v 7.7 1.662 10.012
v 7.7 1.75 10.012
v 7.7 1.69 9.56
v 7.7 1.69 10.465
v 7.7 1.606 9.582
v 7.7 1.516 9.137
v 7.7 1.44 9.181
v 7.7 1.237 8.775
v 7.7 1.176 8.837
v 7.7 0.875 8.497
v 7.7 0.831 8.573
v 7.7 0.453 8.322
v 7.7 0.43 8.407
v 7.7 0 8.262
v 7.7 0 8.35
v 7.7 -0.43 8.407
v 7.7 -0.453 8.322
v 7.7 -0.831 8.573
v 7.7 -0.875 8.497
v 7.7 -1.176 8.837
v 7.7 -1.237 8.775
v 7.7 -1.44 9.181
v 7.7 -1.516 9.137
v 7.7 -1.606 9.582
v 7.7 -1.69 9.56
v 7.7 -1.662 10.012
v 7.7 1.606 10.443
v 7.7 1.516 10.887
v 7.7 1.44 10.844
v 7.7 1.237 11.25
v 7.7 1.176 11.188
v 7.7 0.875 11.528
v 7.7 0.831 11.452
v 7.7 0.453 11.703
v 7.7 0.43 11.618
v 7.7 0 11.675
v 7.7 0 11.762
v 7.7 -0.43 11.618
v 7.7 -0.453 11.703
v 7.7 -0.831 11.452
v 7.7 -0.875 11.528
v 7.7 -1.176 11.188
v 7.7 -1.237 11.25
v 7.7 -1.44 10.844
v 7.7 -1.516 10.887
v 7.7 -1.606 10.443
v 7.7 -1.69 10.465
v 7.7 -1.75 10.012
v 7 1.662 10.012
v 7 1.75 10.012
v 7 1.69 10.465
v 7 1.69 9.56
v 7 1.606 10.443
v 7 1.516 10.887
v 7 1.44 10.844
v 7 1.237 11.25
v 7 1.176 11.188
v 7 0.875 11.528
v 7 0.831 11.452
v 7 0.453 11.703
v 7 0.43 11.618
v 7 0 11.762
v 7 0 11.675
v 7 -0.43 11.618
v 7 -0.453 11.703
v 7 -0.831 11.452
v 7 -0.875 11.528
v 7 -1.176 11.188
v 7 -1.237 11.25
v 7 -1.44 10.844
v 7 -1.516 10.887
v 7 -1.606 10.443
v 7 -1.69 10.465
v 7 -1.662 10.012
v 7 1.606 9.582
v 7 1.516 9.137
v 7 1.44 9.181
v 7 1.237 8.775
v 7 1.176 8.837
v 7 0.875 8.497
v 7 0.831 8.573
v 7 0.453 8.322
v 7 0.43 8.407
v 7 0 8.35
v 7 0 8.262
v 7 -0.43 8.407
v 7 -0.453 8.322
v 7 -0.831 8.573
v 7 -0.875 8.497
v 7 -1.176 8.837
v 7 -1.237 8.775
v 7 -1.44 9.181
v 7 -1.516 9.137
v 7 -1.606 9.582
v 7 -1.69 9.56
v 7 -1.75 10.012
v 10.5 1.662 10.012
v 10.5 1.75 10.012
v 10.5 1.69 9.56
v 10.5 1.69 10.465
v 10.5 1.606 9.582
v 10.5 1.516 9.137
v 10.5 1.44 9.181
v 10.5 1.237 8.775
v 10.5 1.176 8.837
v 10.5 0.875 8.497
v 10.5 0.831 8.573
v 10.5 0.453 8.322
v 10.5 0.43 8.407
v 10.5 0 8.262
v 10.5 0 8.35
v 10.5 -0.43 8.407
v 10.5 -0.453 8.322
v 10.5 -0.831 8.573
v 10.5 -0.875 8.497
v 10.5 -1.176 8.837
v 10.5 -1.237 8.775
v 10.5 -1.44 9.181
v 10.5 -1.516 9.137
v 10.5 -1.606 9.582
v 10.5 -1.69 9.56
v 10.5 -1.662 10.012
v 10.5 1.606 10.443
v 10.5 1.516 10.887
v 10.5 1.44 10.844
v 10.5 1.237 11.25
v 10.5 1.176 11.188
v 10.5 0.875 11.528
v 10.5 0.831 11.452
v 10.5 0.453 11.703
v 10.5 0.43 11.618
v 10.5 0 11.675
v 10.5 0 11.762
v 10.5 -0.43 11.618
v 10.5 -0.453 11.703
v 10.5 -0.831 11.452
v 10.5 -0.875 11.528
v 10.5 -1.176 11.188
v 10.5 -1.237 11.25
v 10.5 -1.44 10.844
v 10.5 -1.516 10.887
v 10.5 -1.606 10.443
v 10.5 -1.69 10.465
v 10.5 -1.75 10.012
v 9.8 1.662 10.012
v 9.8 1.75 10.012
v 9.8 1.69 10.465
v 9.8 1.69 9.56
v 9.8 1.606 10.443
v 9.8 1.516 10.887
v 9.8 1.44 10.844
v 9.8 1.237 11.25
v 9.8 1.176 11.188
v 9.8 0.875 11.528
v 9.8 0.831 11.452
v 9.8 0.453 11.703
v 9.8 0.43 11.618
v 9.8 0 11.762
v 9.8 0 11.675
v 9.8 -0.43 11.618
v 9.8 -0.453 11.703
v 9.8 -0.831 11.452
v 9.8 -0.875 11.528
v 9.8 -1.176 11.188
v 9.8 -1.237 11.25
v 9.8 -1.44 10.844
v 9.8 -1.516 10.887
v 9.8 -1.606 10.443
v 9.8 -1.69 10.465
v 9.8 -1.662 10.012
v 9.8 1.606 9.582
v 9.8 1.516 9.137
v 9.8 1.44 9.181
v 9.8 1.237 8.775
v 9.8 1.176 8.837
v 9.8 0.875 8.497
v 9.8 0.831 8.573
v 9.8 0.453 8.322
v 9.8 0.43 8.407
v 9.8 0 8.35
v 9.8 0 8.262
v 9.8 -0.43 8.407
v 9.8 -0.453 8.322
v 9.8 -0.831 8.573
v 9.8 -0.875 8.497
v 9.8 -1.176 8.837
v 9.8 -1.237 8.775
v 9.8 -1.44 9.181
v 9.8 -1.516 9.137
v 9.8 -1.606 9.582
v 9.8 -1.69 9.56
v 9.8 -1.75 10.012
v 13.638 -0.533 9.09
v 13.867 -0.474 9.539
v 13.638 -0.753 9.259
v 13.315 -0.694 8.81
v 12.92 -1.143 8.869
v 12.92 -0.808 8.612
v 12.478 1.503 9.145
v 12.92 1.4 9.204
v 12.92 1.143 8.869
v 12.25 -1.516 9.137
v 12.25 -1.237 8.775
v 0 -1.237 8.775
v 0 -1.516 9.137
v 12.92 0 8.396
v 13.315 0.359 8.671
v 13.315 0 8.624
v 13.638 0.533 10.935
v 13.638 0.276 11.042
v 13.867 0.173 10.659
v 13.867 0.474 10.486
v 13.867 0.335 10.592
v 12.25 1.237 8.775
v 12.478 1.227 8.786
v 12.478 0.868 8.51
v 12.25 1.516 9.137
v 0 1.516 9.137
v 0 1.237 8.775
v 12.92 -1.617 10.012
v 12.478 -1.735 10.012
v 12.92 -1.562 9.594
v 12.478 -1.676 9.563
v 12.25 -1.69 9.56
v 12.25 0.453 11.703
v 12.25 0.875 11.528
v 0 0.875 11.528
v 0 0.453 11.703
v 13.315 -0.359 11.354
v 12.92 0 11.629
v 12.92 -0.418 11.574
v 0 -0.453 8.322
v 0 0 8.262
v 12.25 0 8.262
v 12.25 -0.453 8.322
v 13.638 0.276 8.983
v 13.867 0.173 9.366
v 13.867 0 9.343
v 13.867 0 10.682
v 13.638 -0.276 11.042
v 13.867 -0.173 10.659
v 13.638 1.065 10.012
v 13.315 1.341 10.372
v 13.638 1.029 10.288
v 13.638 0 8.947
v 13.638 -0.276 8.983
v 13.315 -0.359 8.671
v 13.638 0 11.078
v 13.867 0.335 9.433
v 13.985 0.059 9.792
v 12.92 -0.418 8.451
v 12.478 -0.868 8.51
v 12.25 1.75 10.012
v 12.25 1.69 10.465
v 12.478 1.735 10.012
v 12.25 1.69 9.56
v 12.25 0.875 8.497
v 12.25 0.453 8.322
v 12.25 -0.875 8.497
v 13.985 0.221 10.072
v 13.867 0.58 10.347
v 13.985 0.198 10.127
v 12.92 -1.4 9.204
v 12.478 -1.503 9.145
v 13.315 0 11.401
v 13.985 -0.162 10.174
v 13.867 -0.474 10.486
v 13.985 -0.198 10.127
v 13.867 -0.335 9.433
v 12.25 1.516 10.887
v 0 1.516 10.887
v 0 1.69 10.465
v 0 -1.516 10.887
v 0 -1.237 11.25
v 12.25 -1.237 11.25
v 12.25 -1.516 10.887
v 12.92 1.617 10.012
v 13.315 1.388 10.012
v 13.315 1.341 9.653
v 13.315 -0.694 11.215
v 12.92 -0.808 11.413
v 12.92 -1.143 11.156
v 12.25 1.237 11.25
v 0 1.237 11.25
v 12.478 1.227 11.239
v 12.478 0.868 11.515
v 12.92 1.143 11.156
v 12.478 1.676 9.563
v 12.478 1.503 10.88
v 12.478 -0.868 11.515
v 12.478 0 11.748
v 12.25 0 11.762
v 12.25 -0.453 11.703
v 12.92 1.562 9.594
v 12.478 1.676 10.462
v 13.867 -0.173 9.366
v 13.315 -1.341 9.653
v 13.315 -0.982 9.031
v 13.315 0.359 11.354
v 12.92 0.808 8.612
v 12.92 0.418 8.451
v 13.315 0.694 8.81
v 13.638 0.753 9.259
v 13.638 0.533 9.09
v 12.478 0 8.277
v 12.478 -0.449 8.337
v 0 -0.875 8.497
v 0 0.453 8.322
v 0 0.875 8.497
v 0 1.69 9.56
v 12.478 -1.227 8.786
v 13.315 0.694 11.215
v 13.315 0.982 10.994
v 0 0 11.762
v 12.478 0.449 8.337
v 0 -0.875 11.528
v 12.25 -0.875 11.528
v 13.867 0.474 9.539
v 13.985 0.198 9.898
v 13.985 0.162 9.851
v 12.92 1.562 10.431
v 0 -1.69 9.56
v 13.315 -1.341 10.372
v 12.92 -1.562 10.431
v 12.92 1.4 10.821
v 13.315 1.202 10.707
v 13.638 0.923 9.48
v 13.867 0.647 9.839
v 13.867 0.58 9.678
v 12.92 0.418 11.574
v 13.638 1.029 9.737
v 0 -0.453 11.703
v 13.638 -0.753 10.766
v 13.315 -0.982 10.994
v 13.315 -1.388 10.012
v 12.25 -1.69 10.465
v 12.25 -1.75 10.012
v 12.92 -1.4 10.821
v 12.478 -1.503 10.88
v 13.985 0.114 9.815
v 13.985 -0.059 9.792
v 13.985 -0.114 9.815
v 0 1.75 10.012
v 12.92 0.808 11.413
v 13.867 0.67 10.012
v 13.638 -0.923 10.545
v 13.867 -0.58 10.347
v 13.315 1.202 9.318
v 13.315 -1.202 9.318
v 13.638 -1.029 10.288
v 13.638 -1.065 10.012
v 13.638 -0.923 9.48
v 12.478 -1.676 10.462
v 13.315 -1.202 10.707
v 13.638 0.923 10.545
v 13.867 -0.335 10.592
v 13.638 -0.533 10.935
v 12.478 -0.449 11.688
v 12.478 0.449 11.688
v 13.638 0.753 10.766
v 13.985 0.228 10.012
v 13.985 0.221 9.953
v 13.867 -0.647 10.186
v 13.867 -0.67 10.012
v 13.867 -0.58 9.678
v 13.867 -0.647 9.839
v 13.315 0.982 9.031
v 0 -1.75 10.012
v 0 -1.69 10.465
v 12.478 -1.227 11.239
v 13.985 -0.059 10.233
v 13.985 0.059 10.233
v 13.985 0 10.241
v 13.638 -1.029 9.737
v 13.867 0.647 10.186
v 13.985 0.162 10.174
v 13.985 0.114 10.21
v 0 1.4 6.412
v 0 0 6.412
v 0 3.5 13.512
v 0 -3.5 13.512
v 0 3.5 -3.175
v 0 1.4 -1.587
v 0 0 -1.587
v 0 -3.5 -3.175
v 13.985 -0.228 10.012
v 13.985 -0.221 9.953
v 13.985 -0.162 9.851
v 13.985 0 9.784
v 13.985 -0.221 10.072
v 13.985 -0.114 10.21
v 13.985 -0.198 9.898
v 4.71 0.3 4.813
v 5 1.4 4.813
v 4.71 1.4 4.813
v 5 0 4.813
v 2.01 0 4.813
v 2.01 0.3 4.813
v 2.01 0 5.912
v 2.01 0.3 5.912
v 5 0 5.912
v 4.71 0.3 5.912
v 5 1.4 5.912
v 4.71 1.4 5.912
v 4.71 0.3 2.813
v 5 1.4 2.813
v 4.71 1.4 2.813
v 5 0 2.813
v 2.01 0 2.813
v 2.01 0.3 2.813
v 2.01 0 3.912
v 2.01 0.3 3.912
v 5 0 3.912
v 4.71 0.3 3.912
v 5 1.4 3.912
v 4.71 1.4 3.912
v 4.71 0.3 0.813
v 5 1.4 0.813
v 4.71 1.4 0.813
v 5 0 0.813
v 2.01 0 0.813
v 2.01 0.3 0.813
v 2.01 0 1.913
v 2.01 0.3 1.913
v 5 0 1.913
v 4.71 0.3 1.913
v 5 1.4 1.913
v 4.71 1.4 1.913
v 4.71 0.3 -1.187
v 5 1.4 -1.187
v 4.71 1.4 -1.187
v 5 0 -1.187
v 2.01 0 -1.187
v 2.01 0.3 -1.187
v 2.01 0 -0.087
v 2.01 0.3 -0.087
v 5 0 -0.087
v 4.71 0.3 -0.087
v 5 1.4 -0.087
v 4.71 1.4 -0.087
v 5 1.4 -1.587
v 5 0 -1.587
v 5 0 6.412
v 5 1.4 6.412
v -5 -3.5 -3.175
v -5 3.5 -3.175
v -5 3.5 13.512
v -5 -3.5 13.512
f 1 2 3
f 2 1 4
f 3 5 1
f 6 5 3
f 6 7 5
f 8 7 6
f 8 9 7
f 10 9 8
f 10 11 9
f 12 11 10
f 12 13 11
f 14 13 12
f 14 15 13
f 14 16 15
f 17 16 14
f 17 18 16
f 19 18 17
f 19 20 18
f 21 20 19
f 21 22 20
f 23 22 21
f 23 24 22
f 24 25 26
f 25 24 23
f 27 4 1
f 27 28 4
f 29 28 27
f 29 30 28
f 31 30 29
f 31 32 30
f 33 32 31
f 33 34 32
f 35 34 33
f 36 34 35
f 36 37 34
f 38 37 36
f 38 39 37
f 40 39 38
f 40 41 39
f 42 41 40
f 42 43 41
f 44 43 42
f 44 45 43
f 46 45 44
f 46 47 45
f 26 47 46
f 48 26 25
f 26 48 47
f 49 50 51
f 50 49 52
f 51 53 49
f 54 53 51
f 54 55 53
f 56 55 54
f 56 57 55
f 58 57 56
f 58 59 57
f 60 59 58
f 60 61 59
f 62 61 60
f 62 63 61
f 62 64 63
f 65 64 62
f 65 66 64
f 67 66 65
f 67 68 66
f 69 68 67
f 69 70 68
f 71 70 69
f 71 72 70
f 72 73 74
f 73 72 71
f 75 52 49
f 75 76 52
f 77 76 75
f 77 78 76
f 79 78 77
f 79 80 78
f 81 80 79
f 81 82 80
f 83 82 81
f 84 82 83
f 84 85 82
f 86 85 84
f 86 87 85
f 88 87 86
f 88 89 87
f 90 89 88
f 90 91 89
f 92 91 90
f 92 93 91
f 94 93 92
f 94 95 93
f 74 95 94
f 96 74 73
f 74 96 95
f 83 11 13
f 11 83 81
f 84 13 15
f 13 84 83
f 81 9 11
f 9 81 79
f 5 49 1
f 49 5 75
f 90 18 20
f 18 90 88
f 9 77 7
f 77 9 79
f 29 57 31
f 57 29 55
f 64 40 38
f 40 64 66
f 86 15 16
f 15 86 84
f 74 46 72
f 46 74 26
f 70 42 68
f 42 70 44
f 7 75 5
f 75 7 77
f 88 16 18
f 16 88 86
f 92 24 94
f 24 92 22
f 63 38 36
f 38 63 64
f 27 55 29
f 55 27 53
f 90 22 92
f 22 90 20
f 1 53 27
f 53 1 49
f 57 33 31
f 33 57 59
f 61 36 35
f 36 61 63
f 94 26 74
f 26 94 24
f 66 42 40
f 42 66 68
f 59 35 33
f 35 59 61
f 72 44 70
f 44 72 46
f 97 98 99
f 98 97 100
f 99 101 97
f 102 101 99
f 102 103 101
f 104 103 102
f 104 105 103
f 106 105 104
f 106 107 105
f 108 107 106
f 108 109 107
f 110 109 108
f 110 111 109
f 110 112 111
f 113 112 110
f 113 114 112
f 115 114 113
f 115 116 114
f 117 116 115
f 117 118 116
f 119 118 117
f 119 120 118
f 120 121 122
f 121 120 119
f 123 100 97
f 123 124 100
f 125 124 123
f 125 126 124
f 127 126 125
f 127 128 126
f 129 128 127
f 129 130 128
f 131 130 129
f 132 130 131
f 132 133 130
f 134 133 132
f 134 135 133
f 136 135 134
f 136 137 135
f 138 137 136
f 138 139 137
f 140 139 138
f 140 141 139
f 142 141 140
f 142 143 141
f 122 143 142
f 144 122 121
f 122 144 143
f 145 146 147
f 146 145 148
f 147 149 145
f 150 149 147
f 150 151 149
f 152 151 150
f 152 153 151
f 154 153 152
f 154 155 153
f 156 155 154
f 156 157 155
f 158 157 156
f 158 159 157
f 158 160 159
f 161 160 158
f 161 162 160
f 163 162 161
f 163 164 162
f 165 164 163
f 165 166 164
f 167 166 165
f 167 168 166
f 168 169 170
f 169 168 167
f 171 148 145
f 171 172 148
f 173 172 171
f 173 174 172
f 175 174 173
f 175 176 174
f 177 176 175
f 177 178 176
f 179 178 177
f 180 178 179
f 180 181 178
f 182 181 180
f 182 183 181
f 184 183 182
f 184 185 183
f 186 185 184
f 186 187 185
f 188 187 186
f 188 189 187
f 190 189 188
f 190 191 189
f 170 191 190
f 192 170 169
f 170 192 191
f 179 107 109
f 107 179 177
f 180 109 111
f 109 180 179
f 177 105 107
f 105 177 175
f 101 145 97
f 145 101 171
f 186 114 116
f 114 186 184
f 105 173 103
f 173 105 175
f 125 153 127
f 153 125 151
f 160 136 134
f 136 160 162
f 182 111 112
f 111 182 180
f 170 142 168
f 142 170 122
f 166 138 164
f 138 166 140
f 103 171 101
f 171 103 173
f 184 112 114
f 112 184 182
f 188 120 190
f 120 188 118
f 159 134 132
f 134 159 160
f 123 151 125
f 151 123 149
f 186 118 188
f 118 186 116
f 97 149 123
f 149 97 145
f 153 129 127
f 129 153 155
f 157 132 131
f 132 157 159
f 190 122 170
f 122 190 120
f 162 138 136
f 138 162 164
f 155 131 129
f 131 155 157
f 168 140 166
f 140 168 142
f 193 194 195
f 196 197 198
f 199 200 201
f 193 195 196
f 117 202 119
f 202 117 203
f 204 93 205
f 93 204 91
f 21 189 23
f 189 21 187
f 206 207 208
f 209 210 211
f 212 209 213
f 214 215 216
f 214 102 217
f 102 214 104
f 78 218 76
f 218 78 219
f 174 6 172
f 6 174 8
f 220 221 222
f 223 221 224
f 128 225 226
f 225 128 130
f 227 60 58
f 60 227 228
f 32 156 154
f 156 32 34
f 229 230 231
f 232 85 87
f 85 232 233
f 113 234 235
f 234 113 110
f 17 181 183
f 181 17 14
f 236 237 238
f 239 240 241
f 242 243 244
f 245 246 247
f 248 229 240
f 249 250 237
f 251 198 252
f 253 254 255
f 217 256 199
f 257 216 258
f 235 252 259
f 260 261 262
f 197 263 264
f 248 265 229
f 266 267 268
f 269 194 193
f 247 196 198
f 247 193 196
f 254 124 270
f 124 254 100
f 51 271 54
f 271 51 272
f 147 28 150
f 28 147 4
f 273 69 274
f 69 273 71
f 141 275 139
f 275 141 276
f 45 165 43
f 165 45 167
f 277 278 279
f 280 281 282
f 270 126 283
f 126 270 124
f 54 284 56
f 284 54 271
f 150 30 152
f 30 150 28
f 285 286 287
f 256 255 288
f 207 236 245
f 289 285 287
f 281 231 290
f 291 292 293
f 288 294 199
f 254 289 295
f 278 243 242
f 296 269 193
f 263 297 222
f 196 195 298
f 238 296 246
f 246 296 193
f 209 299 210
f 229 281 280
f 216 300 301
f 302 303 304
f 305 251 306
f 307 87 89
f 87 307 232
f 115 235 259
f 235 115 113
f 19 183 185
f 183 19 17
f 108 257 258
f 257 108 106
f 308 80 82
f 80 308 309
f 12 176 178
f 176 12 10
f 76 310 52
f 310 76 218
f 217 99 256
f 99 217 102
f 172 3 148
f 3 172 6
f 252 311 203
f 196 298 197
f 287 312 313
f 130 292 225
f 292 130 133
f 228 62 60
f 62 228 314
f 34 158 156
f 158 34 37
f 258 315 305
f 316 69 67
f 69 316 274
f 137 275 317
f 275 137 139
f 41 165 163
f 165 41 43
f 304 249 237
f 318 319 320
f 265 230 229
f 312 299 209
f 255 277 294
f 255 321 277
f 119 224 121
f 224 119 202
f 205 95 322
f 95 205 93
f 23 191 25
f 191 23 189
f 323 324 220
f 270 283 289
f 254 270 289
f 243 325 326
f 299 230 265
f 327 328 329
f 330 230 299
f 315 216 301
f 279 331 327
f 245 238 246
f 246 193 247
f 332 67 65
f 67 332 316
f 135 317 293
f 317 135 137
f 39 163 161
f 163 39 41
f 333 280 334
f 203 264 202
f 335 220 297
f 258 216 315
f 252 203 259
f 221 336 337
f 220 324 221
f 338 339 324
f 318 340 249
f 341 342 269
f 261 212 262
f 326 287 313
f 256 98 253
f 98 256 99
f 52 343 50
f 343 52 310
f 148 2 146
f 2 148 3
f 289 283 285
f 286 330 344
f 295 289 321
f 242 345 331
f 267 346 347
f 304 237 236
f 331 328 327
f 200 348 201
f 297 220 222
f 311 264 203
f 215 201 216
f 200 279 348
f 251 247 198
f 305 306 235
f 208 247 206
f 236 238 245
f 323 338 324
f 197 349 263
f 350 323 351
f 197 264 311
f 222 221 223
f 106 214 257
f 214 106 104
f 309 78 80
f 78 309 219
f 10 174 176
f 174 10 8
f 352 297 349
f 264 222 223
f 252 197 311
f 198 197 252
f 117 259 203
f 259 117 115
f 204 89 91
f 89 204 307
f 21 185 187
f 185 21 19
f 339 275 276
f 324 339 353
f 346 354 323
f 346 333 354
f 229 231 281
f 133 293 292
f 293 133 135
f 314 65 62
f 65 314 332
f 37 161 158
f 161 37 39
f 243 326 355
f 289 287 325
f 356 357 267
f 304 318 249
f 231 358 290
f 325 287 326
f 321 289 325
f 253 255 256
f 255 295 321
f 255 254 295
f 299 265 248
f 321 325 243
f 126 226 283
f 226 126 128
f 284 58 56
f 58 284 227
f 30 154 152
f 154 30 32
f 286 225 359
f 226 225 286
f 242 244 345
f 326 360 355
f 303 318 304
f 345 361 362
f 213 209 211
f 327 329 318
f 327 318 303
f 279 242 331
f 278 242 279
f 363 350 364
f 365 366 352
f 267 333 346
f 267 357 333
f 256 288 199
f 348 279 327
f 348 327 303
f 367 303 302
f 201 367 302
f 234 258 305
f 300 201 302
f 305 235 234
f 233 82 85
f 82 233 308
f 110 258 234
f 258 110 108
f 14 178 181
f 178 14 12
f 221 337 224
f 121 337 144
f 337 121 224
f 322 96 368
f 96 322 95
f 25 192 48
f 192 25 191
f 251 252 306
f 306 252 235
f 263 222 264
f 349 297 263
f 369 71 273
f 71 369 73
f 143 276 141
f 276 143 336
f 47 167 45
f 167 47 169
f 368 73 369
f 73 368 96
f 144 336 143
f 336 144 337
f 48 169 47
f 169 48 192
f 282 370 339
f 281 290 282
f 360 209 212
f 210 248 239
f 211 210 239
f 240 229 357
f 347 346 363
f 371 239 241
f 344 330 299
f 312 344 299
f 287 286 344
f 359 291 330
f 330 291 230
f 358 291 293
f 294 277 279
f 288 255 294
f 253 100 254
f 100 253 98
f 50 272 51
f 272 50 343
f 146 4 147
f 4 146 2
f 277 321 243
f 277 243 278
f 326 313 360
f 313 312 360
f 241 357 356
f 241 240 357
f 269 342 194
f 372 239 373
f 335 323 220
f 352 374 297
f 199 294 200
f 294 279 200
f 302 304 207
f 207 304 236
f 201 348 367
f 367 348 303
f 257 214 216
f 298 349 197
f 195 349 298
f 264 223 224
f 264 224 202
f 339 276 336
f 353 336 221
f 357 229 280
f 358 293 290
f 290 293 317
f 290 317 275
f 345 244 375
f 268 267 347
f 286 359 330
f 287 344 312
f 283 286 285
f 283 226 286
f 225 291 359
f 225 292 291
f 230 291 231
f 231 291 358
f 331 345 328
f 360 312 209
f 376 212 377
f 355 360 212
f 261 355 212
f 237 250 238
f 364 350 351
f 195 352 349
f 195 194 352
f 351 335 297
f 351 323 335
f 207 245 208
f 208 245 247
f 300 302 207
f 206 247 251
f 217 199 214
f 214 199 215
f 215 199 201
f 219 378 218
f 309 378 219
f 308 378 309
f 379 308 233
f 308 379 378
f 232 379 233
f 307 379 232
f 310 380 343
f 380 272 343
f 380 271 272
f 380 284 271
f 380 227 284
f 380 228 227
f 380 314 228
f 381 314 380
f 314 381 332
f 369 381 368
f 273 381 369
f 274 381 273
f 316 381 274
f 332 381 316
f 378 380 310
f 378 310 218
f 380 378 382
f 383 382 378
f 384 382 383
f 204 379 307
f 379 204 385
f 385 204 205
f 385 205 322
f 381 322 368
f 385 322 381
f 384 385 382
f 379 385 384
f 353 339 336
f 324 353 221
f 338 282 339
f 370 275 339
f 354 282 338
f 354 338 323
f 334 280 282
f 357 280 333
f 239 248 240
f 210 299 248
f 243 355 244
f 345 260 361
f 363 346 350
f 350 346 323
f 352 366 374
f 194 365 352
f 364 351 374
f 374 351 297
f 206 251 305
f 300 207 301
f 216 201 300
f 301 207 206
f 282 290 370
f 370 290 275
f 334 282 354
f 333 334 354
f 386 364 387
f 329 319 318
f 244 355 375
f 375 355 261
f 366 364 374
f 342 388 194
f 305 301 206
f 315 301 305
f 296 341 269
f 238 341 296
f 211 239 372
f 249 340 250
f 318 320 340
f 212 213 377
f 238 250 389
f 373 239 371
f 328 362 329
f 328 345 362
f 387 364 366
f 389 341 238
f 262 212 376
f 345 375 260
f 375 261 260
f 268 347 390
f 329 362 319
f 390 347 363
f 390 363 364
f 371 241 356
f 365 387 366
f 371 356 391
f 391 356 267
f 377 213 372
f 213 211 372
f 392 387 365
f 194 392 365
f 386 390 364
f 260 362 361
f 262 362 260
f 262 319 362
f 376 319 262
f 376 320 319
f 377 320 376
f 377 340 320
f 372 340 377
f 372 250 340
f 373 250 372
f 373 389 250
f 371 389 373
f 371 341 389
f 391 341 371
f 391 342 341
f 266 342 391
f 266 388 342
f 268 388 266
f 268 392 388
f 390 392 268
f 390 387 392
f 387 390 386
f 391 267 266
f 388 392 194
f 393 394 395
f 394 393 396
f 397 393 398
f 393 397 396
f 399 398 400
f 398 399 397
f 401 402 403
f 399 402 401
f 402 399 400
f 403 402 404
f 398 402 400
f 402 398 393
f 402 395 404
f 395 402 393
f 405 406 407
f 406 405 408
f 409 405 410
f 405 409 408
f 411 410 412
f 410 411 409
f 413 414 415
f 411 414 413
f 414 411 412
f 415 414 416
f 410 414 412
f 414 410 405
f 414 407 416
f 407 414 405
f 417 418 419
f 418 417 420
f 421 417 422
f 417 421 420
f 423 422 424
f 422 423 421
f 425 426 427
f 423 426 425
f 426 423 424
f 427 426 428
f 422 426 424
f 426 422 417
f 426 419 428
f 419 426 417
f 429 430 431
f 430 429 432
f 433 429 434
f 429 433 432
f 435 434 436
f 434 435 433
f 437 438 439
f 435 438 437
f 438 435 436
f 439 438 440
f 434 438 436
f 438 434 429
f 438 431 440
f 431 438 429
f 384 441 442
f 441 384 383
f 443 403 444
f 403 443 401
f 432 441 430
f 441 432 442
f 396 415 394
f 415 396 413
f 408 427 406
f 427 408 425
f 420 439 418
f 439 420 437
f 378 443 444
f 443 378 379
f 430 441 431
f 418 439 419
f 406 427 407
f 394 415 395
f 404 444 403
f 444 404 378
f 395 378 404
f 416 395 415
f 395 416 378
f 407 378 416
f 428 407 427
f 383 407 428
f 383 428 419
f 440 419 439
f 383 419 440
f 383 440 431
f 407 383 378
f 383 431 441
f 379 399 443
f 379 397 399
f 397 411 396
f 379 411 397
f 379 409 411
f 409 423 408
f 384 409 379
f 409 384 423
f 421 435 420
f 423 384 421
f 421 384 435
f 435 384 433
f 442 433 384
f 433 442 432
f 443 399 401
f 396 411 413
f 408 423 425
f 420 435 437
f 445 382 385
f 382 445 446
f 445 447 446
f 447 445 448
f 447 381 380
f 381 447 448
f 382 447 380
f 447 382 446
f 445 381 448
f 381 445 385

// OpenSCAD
/*
Sony TRS+4-pin remote connector
https://github.com/xunker/SonyMDRemote
*/
trs_d = 3.5;
trs_l = 14;

// space between edge of trs plug and pinblock
trs_pinblock_spacing = 1.85;

pinblock_w = 8; // average

// Width of the plastic carrier around the metal pins
pinblock_outside_t = 1.40; // varies by remote, 1.38 to 1.45

// length of the plastic carrier around the metal pins
pinblock_outside_l = 5; // varies by remote from 4.8 to  5.2

pin_spacing = 2; // on-centre spacing
pin_w = 1.1;
pin_l = 3;
// how deep are the cuts in the pinblock?
pin_top_cut = 0.3;

// include pin labels in render?
// include_pin_labels = true;
include_pin_labels = false;

// rotate 90 degrees?
rotate_90 = true;

ff = 0.01;

module trs() {
  $fn = 24;

  module trs_ring() {
    difference() {
      cylinder(d=trs_d*1.1, h=trs_l/20);
      cylinder(d=trs_d*0.95, h=trs_l/20);
    }
  }

  difference() {
    color("lightgrey") hull() {
      translate([0, 0, trs_l-(trs_d/2)]) sphere(d=trs_d);
      cylinder(d=trs_d, h=trs_l-(trs_d/2));
      // cylinder(d=trs_d, h=trs_l);
    }

    color("green") union() {
       translate([0, 0, trs_l*0.5]) trs_ring();
       translate([0, 0, trs_l*0.7]) trs_ring();
    }
  }
}

module pinblock() {
  difference() {
    color("grey") cube([pinblock_w, pinblock_outside_t, pinblock_outside_l]);

    color("gold") union() {
      pins_x_offset = pinblock_w - (pin_spacing*3);
      translate([pins_x_offset/4, 0, (pinblock_outside_l-pin_l)+ff]) for(pin_no = [0:3]) {
        translate([pin_spacing * pin_no, -ff, 0]) {
          cube([pin_w, pin_top_cut+ff, pin_l+ff]);
          translate([0, ff, pin_l-pin_top_cut]) cube([pin_w, pinblock_outside_t+(ff), pin_top_cut+ff]);
        }
      }
    }
  }

  if (include_pin_labels) {
    pin_labels();
  }
}

module pin_labels() {
  text_size = pin_w;
  text_height = 0.1;

  labels = ["Digital Ground", "Remote (in)", "Data (out)", "Vcc"];
  color("red") for (label_no = [0:3]) {
    label = labels[label_no];
    translate([label_no * pin_spacing, pinblock_outside_t/2, pinblock_outside_l]) translate([text_size, 0, 0]) rotate([90, -90, 0]) linear_extrude(height = text_height) text(label, size = text_size, valign="center");
  }
}

module full_connector() {
  trs();
  translate([(trs_d/2) + trs_pinblock_spacing, 0, 0]) pinblock();
  // just something to hold it all together
  translate([-trs_d, -trs_d, -5]) color("grey") cube([(pinblock_w + trs_d + trs_pinblock_spacing) * 1.25, trs_d * 2, 5]);
}

if (rotate_90) {
  translate([0, 0, (pinblock_w + trs_d + trs_pinblock_spacing) * 0.75])
    rotate([0, 90, 0]) full_connector();
} else {
  full_connector();
}
